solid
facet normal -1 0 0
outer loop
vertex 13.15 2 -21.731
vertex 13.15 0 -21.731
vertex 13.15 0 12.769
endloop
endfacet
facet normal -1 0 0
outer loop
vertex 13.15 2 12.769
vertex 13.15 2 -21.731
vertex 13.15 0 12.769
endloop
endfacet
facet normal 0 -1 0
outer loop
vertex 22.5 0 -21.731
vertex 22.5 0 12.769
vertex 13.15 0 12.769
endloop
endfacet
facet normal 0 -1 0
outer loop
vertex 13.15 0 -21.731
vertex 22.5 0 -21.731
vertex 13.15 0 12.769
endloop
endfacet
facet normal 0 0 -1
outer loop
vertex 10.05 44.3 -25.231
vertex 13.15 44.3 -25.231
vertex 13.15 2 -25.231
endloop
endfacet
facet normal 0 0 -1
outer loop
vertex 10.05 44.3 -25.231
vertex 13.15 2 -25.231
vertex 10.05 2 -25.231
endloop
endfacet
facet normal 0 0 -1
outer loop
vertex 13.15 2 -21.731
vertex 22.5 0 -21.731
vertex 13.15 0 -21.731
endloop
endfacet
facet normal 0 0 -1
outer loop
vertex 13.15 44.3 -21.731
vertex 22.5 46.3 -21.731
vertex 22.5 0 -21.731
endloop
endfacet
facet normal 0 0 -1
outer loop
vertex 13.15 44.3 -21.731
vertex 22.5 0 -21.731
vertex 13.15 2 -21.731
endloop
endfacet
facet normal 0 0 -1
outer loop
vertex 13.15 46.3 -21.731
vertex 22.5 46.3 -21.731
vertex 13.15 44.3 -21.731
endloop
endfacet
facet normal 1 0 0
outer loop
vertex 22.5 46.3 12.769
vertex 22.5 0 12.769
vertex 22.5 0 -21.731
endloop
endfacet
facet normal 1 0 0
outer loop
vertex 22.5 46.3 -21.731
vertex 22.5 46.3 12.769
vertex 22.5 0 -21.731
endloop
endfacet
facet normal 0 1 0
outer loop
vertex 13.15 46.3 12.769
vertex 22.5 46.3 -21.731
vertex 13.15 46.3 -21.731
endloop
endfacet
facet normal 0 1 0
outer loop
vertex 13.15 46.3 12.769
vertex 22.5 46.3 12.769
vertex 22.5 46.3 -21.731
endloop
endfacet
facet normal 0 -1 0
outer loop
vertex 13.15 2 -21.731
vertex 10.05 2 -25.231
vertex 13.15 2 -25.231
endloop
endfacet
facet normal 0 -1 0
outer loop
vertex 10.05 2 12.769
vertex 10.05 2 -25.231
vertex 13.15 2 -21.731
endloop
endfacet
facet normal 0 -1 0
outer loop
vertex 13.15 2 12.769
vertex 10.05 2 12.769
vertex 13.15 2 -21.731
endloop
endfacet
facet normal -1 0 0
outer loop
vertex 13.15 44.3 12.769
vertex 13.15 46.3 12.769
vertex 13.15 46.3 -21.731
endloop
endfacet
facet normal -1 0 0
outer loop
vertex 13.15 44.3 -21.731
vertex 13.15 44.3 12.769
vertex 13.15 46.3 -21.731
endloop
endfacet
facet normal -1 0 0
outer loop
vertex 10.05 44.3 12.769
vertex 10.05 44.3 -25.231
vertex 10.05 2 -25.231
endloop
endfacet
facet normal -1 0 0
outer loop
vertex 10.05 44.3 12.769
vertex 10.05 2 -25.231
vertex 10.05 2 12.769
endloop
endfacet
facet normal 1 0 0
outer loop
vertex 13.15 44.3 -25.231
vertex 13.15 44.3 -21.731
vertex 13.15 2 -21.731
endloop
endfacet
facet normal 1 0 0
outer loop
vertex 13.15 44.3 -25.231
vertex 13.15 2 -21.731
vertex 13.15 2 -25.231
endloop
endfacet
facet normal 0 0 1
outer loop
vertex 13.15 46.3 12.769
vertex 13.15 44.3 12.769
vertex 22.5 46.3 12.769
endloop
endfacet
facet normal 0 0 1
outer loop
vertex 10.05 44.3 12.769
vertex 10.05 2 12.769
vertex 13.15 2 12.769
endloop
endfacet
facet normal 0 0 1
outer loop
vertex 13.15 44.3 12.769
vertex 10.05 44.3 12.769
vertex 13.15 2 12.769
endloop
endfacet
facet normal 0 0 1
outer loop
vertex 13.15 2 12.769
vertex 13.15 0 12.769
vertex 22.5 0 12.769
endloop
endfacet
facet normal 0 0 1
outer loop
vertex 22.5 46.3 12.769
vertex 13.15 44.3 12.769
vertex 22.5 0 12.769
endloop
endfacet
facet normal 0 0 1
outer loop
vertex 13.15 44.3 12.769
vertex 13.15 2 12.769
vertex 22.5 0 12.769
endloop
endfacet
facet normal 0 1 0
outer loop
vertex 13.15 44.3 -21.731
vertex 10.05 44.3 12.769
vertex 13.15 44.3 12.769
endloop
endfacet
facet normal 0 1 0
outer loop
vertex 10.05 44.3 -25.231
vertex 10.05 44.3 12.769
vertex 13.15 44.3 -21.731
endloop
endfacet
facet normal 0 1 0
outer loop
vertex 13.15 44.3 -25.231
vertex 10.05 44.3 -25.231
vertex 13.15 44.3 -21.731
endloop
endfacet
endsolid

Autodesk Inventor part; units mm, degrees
ref_plane "YZ Plane" through (0, 0, 0) normal (1, 0, 0) x (0, 1, 0)
ref_plane "XZ Plane" through (0, 0, 0) normal (0, 1, 0) x (-1, 0, 0)
ref_plane "XY Plane" through (0, 0, 0) normal (0, 0, 1) x (1, 0, 0)
sketch "Sketch1" plane through (0, 0, 0) normal (0, 1, 0) x (-1, 0, 0)
  line L0 (-10.0497, 12.7691) -> (-22.4997, 12.7691)
  line L1 (-22.4997, 12.7691) -> (-22.4997, -25.2309)
  line L2 (-22.4997, -25.2309) -> (-10.0497, -25.2309)
  line L3 (-10.0497, -25.2309) -> (-10.0497, 12.7691)
  dimension "d0" = 12.45
  dimension "d1" = 38
extrude "Extrusion1" add sketch "Sketch1" along normal blind 46.3
sketch "Sketch2" plane through (0, 46.3, 0) normal (0, 1, 0) x (1, 0, 0)
  line L0 (13.1497, -12.7691) -> (13.1497, 21.7309)
  line L1 (13.1497, 21.7309) -> (22.4997, 21.7309)
  line L2 (22.4997, 21.7309) -> (22.4997, 25.2309)
  line L3 (22.4997, 25.2309) -> (10.0497, 25.2309) projected
  line L4 (10.0497, 25.2309) -> (10.0497, -12.7691) projected
  line L5 (10.0497, 25.2309) -> (10.0497, -12.7691)
  line L6 (10.0497, -12.7691) -> (13.1497, -12.7691)
  line L7 (13.1497, 21.7309) -> (22.4997, 21.7309)
  point P0 (0, 0)
  point P1 (22.4997, -12.7691)
  point P2 (17.8247, -12.7691)
  point P3 (17.8247, 21.7309)
extrude "Extrusion2" cut sketch "Sketch2" against normal blind 2
sketch "Sketch3" plane through (0, 44.3, 0) normal (0, 1, 0) x (1, 0, 0)
  line L0 (22.4997, -12.7691) -> (22.4997, 25.2309) projected
  line L1 (13.1497, 21.7309) -> (13.1497, -12.7691) projected
  line L2 (22.4997, 21.7309) -> (13.1497, 21.7309)
  line L3 (13.1497, 21.7309) -> (13.1497, 25.2309)
  line L4 (22.4997, 25.2309) -> (10.0497, 25.2309) projected
  line L5 (22.4997, 25.2309) -> (22.4997, 21.7309)
  point P0 (0, 0)
extrude "Extrusion3" cut sketch "Sketch3" against normal blind 44.8625
sketch "Sketch5" plane through (0, 0, 0) normal (0, -1, 0) x (1, 0, 0)
  line L0 (10.0497, -25.2309) -> (10.0497, 12.7691) projected
  line L1 (13.1497, -25.2309) -> (10.0497, -25.2309) projected
  line L2 (10.0497, -25.2309) -> (13.1497, -25.2309)
  line L3 (13.1497, -21.7309) -> (13.1497, 12.7691) projected
  line L4 (13.1497, -25.2309) -> (13.1497, 12.7691)
  line L5 (13.1497, 12.7691) -> (10.0497, 12.7691)
  line L6 (10.0497, 12.7691) -> (10.0497, -25.2309)
  point P0 (0, 0)
extrude "Extrusion4" cut sketch "Sketch5" against normal blind 2
properties part number "MiniBB_SD_PD"
